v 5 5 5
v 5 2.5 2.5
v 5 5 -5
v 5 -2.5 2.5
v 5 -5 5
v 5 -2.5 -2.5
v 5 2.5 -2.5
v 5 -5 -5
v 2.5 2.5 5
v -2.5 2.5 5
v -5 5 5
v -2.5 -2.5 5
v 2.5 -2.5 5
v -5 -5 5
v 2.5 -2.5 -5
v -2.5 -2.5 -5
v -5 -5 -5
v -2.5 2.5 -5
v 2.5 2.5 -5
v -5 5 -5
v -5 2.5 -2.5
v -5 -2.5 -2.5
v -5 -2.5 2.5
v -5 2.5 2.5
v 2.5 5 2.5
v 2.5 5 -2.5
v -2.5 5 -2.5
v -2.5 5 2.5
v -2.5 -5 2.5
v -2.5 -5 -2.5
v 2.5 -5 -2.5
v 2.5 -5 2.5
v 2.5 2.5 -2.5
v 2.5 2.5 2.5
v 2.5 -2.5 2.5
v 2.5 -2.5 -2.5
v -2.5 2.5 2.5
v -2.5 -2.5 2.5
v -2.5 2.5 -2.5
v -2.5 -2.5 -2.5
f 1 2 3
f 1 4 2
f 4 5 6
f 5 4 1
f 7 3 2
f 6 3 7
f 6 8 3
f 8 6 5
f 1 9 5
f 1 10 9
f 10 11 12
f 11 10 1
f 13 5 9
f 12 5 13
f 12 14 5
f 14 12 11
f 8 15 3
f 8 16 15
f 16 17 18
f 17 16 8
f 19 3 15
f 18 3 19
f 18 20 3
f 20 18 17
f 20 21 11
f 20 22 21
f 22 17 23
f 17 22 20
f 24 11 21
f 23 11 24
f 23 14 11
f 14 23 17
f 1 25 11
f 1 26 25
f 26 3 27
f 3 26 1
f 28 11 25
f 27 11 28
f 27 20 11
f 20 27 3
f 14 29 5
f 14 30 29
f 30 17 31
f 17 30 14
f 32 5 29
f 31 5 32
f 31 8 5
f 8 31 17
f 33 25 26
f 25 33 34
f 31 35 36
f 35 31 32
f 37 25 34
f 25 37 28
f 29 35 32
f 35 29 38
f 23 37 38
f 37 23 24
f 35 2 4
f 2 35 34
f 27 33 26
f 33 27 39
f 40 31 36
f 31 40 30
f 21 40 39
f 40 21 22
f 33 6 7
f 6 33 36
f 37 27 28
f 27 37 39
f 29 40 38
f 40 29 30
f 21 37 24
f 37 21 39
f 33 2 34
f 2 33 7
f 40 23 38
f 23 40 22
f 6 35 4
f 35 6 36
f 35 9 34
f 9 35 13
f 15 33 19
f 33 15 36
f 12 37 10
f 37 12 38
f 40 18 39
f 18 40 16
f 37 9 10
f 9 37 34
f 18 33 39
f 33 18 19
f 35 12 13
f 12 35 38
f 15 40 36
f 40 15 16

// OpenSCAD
difference() {
  cube([10,10,10], center=true);
  cube([5,15,5], center=true);
  cube([15,5,5], center=true);
  cube([5,5,15], center=true);
}
